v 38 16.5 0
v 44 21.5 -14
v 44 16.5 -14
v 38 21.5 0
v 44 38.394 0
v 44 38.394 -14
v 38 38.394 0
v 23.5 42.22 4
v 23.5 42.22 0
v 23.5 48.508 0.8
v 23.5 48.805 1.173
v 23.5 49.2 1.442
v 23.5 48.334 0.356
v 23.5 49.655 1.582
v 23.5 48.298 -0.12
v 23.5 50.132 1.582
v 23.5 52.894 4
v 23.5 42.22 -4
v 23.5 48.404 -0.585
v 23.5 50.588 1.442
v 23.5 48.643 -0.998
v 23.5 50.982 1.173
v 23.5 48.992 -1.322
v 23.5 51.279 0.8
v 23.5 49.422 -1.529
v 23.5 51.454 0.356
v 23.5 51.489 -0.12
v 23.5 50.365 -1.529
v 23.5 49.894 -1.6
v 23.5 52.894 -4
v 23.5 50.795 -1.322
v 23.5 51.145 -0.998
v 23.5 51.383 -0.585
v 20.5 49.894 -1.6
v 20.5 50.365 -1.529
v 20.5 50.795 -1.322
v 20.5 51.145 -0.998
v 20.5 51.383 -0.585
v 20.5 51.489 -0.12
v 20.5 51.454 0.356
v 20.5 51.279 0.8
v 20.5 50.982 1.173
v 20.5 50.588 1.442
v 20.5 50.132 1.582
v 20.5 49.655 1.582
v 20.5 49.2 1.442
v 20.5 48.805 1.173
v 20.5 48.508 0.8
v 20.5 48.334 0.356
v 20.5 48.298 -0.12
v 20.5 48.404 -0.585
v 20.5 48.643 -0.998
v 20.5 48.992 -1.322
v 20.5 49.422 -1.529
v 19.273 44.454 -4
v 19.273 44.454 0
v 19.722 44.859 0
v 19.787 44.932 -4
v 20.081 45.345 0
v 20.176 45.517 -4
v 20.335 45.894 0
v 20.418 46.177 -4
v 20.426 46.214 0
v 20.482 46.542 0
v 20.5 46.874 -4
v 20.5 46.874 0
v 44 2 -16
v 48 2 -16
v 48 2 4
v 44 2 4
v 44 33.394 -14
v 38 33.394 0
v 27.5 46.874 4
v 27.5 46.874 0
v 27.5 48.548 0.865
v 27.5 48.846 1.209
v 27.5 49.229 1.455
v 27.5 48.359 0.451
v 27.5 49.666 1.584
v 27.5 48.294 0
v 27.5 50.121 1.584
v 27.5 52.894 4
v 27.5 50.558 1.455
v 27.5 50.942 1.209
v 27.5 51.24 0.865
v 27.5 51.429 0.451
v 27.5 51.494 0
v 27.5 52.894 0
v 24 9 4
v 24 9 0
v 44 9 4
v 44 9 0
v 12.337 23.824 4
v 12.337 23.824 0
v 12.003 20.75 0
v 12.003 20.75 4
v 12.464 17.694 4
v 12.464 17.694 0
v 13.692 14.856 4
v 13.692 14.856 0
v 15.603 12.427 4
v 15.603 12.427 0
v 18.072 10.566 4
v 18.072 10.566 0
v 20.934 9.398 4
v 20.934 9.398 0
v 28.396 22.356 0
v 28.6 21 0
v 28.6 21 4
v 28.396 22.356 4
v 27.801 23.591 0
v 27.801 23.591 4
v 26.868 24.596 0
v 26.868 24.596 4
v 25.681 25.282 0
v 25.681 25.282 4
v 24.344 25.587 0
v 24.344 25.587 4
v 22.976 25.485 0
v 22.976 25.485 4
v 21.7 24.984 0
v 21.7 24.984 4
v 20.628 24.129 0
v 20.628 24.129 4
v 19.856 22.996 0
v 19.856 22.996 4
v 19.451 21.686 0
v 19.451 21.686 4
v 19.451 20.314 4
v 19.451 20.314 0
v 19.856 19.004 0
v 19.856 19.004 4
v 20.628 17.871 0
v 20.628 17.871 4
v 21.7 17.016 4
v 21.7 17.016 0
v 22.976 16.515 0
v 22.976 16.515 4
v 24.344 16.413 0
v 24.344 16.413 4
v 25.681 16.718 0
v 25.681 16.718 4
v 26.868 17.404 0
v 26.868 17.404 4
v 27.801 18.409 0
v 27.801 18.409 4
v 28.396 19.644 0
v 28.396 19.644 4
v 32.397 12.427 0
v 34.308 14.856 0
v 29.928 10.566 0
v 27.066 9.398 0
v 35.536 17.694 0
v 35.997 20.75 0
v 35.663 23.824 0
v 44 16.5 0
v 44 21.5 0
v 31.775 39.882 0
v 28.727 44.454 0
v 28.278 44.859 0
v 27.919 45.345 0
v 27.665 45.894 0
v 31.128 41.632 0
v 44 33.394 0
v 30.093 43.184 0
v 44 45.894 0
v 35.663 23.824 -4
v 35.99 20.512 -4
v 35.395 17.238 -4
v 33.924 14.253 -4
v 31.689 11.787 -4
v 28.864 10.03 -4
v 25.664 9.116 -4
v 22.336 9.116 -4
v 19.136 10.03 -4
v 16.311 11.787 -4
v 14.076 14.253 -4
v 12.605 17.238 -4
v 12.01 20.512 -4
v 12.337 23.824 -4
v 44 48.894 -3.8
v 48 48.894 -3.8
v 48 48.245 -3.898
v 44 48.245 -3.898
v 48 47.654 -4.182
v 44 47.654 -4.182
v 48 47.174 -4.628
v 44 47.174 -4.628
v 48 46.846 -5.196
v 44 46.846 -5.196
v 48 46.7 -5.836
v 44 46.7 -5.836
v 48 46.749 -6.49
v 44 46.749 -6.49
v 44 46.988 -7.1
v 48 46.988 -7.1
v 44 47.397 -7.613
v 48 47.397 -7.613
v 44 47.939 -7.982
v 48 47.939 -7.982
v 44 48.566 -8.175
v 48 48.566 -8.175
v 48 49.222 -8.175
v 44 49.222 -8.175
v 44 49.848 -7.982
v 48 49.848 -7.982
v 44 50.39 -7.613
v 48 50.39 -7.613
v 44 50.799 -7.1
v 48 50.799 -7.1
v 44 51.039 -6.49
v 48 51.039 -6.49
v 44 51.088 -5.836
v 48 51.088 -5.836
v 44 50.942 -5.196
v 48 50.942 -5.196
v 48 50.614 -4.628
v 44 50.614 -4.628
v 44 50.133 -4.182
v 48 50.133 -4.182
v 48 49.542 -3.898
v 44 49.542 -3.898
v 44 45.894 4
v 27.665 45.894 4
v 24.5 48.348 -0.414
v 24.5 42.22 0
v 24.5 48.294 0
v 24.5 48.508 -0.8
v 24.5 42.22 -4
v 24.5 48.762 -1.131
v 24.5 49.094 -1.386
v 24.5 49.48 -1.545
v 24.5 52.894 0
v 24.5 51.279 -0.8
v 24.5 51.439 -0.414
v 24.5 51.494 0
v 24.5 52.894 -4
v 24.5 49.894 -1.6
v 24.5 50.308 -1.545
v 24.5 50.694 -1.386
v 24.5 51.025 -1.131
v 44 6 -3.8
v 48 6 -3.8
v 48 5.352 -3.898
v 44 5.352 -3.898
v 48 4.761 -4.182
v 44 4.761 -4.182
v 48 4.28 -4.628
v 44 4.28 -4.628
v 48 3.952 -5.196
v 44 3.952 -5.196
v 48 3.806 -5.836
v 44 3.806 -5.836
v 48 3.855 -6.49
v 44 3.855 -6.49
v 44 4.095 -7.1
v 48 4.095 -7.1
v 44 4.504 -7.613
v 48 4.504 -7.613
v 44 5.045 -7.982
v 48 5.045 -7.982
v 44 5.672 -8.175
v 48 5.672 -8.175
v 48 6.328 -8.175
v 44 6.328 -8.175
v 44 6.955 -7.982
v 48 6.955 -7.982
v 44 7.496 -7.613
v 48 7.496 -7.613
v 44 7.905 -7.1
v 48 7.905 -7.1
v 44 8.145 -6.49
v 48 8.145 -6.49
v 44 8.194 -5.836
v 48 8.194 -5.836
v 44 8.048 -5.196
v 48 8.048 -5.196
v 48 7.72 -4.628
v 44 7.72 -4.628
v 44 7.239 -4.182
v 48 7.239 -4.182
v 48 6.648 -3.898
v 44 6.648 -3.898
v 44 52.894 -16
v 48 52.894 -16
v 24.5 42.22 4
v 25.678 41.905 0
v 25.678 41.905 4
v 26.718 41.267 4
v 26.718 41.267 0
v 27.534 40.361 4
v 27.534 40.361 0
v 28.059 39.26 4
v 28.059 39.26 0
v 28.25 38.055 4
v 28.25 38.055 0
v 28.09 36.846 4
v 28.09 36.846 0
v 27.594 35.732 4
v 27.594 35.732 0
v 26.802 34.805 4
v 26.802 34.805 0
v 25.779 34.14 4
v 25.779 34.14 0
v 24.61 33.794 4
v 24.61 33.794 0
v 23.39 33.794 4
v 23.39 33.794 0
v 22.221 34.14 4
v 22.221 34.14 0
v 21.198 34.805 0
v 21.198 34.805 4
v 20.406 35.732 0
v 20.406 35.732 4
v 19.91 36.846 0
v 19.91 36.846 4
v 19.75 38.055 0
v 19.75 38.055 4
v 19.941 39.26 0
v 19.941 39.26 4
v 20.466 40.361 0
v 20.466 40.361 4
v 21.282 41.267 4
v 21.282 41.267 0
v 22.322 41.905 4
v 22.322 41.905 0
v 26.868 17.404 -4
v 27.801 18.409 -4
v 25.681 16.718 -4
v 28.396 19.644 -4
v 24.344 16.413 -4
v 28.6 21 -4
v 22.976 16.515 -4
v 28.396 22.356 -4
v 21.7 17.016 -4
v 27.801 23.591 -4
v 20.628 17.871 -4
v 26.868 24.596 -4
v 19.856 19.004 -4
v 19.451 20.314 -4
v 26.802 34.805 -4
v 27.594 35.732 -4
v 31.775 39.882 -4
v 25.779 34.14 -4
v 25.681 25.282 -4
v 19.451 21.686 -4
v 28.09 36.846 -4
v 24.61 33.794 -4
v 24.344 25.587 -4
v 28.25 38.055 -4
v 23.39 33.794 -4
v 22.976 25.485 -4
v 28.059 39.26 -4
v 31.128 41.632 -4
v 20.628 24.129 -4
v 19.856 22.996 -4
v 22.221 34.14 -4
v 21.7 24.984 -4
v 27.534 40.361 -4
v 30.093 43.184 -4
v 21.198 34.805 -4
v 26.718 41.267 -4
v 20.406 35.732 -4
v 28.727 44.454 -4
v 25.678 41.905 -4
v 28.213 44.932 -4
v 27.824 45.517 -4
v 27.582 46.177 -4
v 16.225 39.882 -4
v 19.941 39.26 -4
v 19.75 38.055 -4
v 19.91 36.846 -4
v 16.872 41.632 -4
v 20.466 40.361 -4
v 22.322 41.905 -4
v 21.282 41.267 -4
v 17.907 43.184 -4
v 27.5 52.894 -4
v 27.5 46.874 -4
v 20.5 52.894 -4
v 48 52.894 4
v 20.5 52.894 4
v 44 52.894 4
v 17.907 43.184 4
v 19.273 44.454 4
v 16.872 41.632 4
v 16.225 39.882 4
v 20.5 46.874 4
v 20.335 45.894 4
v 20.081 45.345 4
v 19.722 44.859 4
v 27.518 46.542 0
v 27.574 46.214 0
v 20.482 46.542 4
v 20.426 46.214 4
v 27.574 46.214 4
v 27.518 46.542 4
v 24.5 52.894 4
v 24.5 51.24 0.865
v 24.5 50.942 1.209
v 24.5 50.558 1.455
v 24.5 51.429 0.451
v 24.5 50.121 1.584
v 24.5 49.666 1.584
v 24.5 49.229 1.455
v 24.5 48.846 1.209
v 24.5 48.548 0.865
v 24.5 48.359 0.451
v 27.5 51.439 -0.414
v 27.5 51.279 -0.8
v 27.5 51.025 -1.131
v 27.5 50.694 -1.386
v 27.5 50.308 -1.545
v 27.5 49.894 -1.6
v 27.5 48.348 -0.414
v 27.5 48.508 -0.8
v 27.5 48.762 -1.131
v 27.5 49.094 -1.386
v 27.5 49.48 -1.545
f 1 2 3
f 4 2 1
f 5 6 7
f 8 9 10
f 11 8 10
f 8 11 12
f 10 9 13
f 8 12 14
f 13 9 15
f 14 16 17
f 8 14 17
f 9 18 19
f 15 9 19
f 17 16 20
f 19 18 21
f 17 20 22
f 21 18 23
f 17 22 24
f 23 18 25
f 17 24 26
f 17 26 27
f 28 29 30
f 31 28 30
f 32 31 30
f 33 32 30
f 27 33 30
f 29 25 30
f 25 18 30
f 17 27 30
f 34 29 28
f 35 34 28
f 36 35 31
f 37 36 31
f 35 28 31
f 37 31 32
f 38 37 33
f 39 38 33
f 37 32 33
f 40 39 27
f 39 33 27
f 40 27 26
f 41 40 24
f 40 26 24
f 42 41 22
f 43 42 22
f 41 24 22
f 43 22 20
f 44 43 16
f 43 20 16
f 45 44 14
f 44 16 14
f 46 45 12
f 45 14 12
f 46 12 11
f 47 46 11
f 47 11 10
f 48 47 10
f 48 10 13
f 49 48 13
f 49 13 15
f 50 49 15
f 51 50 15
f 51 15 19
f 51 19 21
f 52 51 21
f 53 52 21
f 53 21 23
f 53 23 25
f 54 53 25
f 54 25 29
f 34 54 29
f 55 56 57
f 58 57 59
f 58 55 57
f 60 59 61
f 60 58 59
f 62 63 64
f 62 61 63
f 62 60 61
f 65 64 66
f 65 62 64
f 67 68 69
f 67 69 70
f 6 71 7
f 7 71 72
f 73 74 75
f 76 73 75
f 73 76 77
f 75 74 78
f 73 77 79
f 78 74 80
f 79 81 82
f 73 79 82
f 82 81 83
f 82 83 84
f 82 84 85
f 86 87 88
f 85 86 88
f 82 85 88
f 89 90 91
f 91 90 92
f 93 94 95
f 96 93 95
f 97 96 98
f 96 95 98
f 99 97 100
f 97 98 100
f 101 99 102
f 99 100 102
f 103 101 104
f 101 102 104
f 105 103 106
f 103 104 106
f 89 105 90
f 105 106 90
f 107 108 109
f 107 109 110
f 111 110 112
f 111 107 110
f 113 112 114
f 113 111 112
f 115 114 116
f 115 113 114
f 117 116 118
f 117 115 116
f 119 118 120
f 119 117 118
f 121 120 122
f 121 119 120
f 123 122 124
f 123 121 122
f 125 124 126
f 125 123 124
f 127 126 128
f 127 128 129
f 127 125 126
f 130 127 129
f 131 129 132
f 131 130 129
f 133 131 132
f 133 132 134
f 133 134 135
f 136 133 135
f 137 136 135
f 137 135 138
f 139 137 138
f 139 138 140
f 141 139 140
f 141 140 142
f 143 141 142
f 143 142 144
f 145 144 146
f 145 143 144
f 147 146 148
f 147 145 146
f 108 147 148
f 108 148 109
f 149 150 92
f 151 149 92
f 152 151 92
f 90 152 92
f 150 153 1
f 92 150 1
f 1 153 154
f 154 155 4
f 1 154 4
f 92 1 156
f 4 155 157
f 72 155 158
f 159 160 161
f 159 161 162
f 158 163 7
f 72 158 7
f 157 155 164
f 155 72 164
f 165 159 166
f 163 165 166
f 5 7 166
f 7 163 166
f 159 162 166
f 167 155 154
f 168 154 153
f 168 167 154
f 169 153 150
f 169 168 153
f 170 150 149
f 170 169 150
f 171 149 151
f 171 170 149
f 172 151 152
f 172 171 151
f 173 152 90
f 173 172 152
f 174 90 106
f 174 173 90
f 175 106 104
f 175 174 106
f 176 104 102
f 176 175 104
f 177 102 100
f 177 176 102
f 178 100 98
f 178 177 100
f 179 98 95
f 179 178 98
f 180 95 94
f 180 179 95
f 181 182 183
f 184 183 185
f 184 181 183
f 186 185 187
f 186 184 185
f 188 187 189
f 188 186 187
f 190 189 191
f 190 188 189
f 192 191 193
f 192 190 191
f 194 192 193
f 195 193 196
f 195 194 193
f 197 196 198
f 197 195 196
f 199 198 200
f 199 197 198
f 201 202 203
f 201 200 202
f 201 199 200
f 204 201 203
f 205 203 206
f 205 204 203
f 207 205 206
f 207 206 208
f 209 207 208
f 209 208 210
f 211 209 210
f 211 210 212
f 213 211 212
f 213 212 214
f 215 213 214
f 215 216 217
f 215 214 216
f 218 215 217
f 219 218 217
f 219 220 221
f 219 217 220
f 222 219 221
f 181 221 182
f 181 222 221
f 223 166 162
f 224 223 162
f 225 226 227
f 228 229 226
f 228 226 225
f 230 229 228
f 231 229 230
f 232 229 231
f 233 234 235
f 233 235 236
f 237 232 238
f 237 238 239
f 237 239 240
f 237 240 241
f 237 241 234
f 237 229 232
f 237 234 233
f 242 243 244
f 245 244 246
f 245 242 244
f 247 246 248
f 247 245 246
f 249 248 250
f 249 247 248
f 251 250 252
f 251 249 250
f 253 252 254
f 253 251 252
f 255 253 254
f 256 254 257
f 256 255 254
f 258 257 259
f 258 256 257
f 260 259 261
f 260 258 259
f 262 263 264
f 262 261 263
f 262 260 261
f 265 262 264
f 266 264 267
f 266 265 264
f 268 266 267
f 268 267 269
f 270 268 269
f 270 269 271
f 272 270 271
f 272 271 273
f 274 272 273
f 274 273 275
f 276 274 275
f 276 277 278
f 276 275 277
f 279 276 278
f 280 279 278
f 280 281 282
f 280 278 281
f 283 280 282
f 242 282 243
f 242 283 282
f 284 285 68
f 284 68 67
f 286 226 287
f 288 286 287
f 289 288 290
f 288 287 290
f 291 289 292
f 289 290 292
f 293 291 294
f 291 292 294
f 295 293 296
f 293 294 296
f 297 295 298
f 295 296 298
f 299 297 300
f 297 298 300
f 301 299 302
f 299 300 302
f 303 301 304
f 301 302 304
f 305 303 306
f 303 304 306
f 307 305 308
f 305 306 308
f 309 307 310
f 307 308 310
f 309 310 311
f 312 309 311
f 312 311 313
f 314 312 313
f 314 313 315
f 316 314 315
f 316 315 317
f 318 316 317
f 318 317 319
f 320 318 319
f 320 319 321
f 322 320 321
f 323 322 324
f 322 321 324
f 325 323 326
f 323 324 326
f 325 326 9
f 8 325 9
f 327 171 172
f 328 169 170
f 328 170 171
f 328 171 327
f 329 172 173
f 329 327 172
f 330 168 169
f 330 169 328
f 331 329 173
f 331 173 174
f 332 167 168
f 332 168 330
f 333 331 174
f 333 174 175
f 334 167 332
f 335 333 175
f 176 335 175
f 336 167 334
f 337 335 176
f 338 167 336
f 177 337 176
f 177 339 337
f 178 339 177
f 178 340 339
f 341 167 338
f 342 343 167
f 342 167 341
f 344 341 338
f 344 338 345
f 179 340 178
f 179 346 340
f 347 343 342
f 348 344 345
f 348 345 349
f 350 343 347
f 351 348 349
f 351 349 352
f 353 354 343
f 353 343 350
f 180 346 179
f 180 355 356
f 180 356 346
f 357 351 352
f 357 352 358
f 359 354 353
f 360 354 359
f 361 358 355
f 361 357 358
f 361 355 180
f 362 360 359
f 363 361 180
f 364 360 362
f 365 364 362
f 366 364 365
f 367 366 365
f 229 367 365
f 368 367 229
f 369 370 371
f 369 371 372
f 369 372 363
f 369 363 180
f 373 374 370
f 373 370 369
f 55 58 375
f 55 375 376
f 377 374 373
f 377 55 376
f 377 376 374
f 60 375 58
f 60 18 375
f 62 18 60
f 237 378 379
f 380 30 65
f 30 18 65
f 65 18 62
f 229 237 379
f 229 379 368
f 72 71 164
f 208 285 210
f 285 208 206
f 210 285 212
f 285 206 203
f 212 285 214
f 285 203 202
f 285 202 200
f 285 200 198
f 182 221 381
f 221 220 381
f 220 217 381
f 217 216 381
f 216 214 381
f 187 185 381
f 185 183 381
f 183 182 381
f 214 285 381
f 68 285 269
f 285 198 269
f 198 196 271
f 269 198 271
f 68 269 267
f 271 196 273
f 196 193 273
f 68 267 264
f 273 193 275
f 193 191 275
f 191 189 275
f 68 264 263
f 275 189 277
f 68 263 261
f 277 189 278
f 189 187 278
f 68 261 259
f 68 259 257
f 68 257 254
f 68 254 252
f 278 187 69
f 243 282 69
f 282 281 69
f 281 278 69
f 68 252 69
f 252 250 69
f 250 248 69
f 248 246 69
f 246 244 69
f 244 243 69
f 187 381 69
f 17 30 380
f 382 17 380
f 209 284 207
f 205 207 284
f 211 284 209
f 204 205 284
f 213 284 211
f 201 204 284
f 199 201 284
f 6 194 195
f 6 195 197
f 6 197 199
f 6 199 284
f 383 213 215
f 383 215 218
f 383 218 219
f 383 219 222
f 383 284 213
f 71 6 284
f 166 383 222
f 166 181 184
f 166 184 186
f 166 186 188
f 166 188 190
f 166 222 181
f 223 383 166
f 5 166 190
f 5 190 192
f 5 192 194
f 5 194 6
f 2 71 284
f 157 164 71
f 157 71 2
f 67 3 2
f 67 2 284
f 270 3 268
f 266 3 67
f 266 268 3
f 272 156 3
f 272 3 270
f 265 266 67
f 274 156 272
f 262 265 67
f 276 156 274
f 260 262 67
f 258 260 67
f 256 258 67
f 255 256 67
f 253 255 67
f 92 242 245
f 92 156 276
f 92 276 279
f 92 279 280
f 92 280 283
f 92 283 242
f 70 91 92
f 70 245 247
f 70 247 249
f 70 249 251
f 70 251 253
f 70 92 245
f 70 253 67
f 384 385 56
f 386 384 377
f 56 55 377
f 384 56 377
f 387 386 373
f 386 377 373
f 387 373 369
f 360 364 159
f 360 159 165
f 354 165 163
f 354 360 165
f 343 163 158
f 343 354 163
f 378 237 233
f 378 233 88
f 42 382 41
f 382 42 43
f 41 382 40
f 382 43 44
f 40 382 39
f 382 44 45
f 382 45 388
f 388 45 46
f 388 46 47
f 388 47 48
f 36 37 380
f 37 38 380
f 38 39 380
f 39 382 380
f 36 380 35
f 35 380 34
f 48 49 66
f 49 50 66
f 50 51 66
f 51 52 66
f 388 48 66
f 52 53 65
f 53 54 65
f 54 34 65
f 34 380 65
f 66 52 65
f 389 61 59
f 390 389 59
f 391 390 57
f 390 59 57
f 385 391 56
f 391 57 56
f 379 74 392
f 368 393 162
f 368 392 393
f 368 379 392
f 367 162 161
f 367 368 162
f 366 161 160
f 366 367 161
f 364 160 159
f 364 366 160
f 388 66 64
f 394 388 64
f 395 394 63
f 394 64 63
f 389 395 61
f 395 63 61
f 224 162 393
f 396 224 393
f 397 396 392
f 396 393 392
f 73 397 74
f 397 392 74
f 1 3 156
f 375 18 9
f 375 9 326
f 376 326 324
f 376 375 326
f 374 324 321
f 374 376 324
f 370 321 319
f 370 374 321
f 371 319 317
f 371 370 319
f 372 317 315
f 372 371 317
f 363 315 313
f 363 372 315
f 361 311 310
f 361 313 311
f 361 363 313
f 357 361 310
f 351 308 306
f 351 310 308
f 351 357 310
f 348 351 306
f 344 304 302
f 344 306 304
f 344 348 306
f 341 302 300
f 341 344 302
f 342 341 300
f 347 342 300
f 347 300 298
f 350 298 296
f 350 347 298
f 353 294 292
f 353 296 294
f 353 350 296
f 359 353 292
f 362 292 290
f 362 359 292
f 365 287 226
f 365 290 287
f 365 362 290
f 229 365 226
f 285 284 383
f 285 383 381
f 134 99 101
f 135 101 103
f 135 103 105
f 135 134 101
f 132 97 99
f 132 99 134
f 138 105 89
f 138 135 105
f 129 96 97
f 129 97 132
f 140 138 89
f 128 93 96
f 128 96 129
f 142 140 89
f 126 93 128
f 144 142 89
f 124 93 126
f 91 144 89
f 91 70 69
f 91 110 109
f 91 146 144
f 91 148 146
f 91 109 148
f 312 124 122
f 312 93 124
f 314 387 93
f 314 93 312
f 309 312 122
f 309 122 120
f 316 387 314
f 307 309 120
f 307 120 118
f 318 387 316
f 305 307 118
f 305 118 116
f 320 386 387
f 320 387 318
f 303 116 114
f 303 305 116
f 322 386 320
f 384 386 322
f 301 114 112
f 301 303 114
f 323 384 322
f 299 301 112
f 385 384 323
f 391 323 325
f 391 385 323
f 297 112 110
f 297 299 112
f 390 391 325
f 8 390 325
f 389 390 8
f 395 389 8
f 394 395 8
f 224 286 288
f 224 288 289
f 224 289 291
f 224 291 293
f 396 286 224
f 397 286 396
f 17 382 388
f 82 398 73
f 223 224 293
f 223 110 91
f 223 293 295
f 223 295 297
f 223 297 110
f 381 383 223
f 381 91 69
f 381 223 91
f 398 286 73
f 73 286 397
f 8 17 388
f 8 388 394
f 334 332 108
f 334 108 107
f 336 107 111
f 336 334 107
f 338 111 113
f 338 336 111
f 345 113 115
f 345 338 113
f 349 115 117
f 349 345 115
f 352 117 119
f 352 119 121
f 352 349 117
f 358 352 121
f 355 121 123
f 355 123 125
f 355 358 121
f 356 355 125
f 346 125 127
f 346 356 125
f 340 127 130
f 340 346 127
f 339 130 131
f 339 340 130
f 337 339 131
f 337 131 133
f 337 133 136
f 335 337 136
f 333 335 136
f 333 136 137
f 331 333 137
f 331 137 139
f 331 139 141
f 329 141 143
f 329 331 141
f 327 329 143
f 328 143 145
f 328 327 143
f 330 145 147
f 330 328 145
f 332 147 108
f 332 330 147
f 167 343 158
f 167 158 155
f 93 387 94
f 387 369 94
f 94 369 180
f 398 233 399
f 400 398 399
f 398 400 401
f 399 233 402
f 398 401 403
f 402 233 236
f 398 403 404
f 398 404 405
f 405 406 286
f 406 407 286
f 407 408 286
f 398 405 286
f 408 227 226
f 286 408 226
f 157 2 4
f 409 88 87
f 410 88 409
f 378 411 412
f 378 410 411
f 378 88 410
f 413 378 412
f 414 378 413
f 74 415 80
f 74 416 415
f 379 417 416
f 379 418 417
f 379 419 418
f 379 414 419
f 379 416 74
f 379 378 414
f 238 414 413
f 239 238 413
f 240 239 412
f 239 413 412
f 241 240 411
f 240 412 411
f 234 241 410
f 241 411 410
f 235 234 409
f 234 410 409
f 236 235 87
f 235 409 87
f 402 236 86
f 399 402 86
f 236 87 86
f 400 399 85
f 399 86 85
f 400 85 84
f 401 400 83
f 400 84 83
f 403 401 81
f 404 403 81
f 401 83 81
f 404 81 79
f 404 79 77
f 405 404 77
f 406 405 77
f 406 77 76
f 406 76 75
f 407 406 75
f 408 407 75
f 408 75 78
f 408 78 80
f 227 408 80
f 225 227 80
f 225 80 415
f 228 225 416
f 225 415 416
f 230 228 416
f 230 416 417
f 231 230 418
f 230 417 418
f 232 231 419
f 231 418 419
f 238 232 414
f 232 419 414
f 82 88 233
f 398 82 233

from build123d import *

# Parameters (mm, degrees)
SKETCH_1_R          = 4.6
EXTRUDE_1_DEPTH     = 4
EXTRUDE_START       = -4
SKETCH_1_4_R        = 4.6
EXTRUDE_2_DEPTH     = 4
EXTRUDE_3_DEPTH     = 12
SKETCH_4_R          = 2.2
CUT_EXTRUDE_2_DEPTH = 64.857250973
SKETCH_4_3_R        = 1.6
CUT_EXTRUDE_3_DEPTH = 64.857250973
RIB_6_REACH         = 62.9
SKETCH_6_WALL_W     = 139.031153846
SKETCH_6_WALL_H     = 5
RIB_7_REACH         = 62.9
SKETCH_8_WALL_W     = 139.031153846
SKETCH_8_WALL_H     = 5


with BuildPart() as part:
    # 草图1 → 凸台-拉伸1 (new body)
    with BuildSketch(Plane.XY):
        with BuildLine():
            ThreePointArc((19.272727273, 44.453905218), (17.343879539, 42.438024382), (16.224606286, 39.882352941))
            Line((16.224606286, 39.882352941), (12.336909429, 23.823529412))
            ThreePointArc((12.336909429, 23.823529412), (14.569137024, 13.579836691), (24, 9))
            Line((24, 9), (44, 9))
            Line((44, 9), (44, 2))
            Line((44, 2), (48, 2))
            Line((48, 2), (48, 52.893747285))
            Line((48, 52.893747285), (44, 52.893747285))
            Line((44, 52.893747285), (44, 45.893747285))
            Line((44, 45.893747285), (27.664709895, 45.893747285))
            ThreePointArc((27.664709895, 45.893747285), (27.541464018, 46.377063498), (27.5, 46.874119675))
            Line((27.5, 46.874119675), (27.5, 52.893747285))
            Line((27.5, 52.893747285), (24.5, 52.893747285))
            Line((24.5, 52.893747285), (24.5, 42.220485754))
            ThreePointArc((24.5, 42.220485754), (24, 33.75), (23.5, 42.220485754))
            Line((23.5, 42.220485754), (23.5, 52.893747285))
            Line((23.5, 52.893747285), (20.5, 52.893747285))
            Line((20.5, 52.893747285), (20.5, 46.874119675))
            ThreePointArc((20.5, 46.874119675), (20.458535982, 46.377063498), (20.335290105, 45.893747285))
            ThreePointArc((20.335290105, 45.893747285), (19.913864605, 45.092755684), (19.272727273, 44.453905218))
        make_face()
        with Locations((24, 21)):
            Circle(SKETCH_1_R, mode=Mode.SUBTRACT)
    extrude(amount=EXTRUDE_1_DEPTH)

    # 草图1<4> → 凸台-拉伸2 (add)
    # profile 1 of 2: a face of its own
    with BuildSketch(Plane.XY.offset(EXTRUDE_START)):
        Polygon((44, 45.893747285), (44, 52.893747285), (48, 52.893747285), (48, 2), (44, 2), (44, 9), align=None)
    # profile 2 of 2: a face of its own
    with BuildSketch(Plane.XY.offset(EXTRUDE_START)):
        with BuildLine():
            ThreePointArc((27.5, 46.874119675), (27.824352245, 45.517318624), (28.727272727, 44.453905218))
            ThreePointArc((28.727272727, 44.453905218), (30.656120461, 42.438024382), (31.775393714, 39.882352941))
            Line((31.775393714, 39.882352941), (35.663090571, 23.823529412))
            ThreePointArc((35.663090571, 23.823529412), (24, 9), (12.336909429, 23.823529412))
            Line((12.336909429, 23.823529412), (16.224606286, 39.882352941))
            ThreePointArc((16.224606286, 39.882352941), (17.343879539, 42.438024382), (19.272727273, 44.453905218))
            ThreePointArc((19.272727273, 44.453905218), (20.175647755, 45.517318624), (20.5, 46.874119675))
            Line((20.5, 46.874119675), (20.5, 52.893747285))
            Line((20.5, 52.893747285), (23.5, 52.893747285))
            Line((23.5, 52.893747285), (23.5, 42.220485754))
            ThreePointArc((23.5, 42.220485754), (24, 33.75), (24.5, 42.220485754))
            Line((24.5, 42.220485754), (24.5, 52.893747285))
            Line((24.5, 52.893747285), (27.5, 52.893747285))
            Line((27.5, 52.893747285), (27.5, 46.874119675))
        make_face()
        with Locations((24, 21)):
            Circle(SKETCH_1_4_R, mode=Mode.SUBTRACT)
    extrude(amount=EXTRUDE_2_DEPTH)

    # 草图1<5> → 凸台-拉伸3 (add)
    with BuildSketch(Plane.XY.offset(EXTRUDE_START)):
        Polygon((44, 45.893747285), (44, 52.893747285), (48, 52.893747285), (48, 2), (44, 2), (44, 9), align=None)
    extrude(amount=-EXTRUDE_3_DEPTH)

    # 草图4 → 切除-拉伸2 (cut, through all)
    with BuildSketch(Plane(origin=(44, 0, 0), x_dir=(0, 0, -1), z_dir=(1, 0, 0))):
        with Locations(Location((6, 6, 0), (0, 0, 180))):
            Circle(SKETCH_4_R)
        with Locations(Location((6, 48.893747285, 0), (0, 0, 180))):
            Circle(SKETCH_4_R)
    extrude(amount=CUT_EXTRUDE_2_DEPTH, mode=Mode.SUBTRACT)

    # 草图4<3> → 切除-拉伸3 (cut, through all)
    with BuildSketch(Plane(origin=(44, 0, 0), x_dir=(0, 0, -1), z_dir=(1, 0, 0))):
        with Locations((0, 49.893747285)):
            Circle(SKETCH_4_3_R)
    extrude(amount=-CUT_EXTRUDE_3_DEPTH, mode=Mode.SUBTRACT)

    # 草图6 wall → 筋6 (add, up to next)
    with BuildSketch(Plane(origin=(41, 19, -7), x_dir=(-0.393919298579, 0, 0.919145030018), z_dir=(-0.919145030018, 0, -0.393919298579)), mode=Mode.PRIVATE) as rib_6_sk1:
        Rectangle(SKETCH_6_WALL_W, SKETCH_6_WALL_H)
    rib_6_tool1 = extrude(rib_6_sk1.sketch, amount=-RIB_6_REACH, mode=Mode.PRIVATE) - part.part
    add(rib_6_tool1.solids().sort_by_distance((41, 19, -7))[0])

    # 草图8 wall → 筋7 (add, up to next)
    with BuildSketch(Plane(origin=(41, 35.893747285, -7), x_dir=(-0.393919298579, 0, 0.919145030018), z_dir=(0.919145030018, 0, 0.393919298579)), mode=Mode.PRIVATE) as rib_7_sk1:
        Rectangle(SKETCH_8_WALL_W, SKETCH_8_WALL_H)
    rib_7_tool1 = extrude(rib_7_sk1.sketch, amount=RIB_7_REACH, mode=Mode.PRIVATE) - part.part
    add(rib_7_tool1.solids().sort_by_distance((41, 35.893747285, -7))[0])


solid = part.part
